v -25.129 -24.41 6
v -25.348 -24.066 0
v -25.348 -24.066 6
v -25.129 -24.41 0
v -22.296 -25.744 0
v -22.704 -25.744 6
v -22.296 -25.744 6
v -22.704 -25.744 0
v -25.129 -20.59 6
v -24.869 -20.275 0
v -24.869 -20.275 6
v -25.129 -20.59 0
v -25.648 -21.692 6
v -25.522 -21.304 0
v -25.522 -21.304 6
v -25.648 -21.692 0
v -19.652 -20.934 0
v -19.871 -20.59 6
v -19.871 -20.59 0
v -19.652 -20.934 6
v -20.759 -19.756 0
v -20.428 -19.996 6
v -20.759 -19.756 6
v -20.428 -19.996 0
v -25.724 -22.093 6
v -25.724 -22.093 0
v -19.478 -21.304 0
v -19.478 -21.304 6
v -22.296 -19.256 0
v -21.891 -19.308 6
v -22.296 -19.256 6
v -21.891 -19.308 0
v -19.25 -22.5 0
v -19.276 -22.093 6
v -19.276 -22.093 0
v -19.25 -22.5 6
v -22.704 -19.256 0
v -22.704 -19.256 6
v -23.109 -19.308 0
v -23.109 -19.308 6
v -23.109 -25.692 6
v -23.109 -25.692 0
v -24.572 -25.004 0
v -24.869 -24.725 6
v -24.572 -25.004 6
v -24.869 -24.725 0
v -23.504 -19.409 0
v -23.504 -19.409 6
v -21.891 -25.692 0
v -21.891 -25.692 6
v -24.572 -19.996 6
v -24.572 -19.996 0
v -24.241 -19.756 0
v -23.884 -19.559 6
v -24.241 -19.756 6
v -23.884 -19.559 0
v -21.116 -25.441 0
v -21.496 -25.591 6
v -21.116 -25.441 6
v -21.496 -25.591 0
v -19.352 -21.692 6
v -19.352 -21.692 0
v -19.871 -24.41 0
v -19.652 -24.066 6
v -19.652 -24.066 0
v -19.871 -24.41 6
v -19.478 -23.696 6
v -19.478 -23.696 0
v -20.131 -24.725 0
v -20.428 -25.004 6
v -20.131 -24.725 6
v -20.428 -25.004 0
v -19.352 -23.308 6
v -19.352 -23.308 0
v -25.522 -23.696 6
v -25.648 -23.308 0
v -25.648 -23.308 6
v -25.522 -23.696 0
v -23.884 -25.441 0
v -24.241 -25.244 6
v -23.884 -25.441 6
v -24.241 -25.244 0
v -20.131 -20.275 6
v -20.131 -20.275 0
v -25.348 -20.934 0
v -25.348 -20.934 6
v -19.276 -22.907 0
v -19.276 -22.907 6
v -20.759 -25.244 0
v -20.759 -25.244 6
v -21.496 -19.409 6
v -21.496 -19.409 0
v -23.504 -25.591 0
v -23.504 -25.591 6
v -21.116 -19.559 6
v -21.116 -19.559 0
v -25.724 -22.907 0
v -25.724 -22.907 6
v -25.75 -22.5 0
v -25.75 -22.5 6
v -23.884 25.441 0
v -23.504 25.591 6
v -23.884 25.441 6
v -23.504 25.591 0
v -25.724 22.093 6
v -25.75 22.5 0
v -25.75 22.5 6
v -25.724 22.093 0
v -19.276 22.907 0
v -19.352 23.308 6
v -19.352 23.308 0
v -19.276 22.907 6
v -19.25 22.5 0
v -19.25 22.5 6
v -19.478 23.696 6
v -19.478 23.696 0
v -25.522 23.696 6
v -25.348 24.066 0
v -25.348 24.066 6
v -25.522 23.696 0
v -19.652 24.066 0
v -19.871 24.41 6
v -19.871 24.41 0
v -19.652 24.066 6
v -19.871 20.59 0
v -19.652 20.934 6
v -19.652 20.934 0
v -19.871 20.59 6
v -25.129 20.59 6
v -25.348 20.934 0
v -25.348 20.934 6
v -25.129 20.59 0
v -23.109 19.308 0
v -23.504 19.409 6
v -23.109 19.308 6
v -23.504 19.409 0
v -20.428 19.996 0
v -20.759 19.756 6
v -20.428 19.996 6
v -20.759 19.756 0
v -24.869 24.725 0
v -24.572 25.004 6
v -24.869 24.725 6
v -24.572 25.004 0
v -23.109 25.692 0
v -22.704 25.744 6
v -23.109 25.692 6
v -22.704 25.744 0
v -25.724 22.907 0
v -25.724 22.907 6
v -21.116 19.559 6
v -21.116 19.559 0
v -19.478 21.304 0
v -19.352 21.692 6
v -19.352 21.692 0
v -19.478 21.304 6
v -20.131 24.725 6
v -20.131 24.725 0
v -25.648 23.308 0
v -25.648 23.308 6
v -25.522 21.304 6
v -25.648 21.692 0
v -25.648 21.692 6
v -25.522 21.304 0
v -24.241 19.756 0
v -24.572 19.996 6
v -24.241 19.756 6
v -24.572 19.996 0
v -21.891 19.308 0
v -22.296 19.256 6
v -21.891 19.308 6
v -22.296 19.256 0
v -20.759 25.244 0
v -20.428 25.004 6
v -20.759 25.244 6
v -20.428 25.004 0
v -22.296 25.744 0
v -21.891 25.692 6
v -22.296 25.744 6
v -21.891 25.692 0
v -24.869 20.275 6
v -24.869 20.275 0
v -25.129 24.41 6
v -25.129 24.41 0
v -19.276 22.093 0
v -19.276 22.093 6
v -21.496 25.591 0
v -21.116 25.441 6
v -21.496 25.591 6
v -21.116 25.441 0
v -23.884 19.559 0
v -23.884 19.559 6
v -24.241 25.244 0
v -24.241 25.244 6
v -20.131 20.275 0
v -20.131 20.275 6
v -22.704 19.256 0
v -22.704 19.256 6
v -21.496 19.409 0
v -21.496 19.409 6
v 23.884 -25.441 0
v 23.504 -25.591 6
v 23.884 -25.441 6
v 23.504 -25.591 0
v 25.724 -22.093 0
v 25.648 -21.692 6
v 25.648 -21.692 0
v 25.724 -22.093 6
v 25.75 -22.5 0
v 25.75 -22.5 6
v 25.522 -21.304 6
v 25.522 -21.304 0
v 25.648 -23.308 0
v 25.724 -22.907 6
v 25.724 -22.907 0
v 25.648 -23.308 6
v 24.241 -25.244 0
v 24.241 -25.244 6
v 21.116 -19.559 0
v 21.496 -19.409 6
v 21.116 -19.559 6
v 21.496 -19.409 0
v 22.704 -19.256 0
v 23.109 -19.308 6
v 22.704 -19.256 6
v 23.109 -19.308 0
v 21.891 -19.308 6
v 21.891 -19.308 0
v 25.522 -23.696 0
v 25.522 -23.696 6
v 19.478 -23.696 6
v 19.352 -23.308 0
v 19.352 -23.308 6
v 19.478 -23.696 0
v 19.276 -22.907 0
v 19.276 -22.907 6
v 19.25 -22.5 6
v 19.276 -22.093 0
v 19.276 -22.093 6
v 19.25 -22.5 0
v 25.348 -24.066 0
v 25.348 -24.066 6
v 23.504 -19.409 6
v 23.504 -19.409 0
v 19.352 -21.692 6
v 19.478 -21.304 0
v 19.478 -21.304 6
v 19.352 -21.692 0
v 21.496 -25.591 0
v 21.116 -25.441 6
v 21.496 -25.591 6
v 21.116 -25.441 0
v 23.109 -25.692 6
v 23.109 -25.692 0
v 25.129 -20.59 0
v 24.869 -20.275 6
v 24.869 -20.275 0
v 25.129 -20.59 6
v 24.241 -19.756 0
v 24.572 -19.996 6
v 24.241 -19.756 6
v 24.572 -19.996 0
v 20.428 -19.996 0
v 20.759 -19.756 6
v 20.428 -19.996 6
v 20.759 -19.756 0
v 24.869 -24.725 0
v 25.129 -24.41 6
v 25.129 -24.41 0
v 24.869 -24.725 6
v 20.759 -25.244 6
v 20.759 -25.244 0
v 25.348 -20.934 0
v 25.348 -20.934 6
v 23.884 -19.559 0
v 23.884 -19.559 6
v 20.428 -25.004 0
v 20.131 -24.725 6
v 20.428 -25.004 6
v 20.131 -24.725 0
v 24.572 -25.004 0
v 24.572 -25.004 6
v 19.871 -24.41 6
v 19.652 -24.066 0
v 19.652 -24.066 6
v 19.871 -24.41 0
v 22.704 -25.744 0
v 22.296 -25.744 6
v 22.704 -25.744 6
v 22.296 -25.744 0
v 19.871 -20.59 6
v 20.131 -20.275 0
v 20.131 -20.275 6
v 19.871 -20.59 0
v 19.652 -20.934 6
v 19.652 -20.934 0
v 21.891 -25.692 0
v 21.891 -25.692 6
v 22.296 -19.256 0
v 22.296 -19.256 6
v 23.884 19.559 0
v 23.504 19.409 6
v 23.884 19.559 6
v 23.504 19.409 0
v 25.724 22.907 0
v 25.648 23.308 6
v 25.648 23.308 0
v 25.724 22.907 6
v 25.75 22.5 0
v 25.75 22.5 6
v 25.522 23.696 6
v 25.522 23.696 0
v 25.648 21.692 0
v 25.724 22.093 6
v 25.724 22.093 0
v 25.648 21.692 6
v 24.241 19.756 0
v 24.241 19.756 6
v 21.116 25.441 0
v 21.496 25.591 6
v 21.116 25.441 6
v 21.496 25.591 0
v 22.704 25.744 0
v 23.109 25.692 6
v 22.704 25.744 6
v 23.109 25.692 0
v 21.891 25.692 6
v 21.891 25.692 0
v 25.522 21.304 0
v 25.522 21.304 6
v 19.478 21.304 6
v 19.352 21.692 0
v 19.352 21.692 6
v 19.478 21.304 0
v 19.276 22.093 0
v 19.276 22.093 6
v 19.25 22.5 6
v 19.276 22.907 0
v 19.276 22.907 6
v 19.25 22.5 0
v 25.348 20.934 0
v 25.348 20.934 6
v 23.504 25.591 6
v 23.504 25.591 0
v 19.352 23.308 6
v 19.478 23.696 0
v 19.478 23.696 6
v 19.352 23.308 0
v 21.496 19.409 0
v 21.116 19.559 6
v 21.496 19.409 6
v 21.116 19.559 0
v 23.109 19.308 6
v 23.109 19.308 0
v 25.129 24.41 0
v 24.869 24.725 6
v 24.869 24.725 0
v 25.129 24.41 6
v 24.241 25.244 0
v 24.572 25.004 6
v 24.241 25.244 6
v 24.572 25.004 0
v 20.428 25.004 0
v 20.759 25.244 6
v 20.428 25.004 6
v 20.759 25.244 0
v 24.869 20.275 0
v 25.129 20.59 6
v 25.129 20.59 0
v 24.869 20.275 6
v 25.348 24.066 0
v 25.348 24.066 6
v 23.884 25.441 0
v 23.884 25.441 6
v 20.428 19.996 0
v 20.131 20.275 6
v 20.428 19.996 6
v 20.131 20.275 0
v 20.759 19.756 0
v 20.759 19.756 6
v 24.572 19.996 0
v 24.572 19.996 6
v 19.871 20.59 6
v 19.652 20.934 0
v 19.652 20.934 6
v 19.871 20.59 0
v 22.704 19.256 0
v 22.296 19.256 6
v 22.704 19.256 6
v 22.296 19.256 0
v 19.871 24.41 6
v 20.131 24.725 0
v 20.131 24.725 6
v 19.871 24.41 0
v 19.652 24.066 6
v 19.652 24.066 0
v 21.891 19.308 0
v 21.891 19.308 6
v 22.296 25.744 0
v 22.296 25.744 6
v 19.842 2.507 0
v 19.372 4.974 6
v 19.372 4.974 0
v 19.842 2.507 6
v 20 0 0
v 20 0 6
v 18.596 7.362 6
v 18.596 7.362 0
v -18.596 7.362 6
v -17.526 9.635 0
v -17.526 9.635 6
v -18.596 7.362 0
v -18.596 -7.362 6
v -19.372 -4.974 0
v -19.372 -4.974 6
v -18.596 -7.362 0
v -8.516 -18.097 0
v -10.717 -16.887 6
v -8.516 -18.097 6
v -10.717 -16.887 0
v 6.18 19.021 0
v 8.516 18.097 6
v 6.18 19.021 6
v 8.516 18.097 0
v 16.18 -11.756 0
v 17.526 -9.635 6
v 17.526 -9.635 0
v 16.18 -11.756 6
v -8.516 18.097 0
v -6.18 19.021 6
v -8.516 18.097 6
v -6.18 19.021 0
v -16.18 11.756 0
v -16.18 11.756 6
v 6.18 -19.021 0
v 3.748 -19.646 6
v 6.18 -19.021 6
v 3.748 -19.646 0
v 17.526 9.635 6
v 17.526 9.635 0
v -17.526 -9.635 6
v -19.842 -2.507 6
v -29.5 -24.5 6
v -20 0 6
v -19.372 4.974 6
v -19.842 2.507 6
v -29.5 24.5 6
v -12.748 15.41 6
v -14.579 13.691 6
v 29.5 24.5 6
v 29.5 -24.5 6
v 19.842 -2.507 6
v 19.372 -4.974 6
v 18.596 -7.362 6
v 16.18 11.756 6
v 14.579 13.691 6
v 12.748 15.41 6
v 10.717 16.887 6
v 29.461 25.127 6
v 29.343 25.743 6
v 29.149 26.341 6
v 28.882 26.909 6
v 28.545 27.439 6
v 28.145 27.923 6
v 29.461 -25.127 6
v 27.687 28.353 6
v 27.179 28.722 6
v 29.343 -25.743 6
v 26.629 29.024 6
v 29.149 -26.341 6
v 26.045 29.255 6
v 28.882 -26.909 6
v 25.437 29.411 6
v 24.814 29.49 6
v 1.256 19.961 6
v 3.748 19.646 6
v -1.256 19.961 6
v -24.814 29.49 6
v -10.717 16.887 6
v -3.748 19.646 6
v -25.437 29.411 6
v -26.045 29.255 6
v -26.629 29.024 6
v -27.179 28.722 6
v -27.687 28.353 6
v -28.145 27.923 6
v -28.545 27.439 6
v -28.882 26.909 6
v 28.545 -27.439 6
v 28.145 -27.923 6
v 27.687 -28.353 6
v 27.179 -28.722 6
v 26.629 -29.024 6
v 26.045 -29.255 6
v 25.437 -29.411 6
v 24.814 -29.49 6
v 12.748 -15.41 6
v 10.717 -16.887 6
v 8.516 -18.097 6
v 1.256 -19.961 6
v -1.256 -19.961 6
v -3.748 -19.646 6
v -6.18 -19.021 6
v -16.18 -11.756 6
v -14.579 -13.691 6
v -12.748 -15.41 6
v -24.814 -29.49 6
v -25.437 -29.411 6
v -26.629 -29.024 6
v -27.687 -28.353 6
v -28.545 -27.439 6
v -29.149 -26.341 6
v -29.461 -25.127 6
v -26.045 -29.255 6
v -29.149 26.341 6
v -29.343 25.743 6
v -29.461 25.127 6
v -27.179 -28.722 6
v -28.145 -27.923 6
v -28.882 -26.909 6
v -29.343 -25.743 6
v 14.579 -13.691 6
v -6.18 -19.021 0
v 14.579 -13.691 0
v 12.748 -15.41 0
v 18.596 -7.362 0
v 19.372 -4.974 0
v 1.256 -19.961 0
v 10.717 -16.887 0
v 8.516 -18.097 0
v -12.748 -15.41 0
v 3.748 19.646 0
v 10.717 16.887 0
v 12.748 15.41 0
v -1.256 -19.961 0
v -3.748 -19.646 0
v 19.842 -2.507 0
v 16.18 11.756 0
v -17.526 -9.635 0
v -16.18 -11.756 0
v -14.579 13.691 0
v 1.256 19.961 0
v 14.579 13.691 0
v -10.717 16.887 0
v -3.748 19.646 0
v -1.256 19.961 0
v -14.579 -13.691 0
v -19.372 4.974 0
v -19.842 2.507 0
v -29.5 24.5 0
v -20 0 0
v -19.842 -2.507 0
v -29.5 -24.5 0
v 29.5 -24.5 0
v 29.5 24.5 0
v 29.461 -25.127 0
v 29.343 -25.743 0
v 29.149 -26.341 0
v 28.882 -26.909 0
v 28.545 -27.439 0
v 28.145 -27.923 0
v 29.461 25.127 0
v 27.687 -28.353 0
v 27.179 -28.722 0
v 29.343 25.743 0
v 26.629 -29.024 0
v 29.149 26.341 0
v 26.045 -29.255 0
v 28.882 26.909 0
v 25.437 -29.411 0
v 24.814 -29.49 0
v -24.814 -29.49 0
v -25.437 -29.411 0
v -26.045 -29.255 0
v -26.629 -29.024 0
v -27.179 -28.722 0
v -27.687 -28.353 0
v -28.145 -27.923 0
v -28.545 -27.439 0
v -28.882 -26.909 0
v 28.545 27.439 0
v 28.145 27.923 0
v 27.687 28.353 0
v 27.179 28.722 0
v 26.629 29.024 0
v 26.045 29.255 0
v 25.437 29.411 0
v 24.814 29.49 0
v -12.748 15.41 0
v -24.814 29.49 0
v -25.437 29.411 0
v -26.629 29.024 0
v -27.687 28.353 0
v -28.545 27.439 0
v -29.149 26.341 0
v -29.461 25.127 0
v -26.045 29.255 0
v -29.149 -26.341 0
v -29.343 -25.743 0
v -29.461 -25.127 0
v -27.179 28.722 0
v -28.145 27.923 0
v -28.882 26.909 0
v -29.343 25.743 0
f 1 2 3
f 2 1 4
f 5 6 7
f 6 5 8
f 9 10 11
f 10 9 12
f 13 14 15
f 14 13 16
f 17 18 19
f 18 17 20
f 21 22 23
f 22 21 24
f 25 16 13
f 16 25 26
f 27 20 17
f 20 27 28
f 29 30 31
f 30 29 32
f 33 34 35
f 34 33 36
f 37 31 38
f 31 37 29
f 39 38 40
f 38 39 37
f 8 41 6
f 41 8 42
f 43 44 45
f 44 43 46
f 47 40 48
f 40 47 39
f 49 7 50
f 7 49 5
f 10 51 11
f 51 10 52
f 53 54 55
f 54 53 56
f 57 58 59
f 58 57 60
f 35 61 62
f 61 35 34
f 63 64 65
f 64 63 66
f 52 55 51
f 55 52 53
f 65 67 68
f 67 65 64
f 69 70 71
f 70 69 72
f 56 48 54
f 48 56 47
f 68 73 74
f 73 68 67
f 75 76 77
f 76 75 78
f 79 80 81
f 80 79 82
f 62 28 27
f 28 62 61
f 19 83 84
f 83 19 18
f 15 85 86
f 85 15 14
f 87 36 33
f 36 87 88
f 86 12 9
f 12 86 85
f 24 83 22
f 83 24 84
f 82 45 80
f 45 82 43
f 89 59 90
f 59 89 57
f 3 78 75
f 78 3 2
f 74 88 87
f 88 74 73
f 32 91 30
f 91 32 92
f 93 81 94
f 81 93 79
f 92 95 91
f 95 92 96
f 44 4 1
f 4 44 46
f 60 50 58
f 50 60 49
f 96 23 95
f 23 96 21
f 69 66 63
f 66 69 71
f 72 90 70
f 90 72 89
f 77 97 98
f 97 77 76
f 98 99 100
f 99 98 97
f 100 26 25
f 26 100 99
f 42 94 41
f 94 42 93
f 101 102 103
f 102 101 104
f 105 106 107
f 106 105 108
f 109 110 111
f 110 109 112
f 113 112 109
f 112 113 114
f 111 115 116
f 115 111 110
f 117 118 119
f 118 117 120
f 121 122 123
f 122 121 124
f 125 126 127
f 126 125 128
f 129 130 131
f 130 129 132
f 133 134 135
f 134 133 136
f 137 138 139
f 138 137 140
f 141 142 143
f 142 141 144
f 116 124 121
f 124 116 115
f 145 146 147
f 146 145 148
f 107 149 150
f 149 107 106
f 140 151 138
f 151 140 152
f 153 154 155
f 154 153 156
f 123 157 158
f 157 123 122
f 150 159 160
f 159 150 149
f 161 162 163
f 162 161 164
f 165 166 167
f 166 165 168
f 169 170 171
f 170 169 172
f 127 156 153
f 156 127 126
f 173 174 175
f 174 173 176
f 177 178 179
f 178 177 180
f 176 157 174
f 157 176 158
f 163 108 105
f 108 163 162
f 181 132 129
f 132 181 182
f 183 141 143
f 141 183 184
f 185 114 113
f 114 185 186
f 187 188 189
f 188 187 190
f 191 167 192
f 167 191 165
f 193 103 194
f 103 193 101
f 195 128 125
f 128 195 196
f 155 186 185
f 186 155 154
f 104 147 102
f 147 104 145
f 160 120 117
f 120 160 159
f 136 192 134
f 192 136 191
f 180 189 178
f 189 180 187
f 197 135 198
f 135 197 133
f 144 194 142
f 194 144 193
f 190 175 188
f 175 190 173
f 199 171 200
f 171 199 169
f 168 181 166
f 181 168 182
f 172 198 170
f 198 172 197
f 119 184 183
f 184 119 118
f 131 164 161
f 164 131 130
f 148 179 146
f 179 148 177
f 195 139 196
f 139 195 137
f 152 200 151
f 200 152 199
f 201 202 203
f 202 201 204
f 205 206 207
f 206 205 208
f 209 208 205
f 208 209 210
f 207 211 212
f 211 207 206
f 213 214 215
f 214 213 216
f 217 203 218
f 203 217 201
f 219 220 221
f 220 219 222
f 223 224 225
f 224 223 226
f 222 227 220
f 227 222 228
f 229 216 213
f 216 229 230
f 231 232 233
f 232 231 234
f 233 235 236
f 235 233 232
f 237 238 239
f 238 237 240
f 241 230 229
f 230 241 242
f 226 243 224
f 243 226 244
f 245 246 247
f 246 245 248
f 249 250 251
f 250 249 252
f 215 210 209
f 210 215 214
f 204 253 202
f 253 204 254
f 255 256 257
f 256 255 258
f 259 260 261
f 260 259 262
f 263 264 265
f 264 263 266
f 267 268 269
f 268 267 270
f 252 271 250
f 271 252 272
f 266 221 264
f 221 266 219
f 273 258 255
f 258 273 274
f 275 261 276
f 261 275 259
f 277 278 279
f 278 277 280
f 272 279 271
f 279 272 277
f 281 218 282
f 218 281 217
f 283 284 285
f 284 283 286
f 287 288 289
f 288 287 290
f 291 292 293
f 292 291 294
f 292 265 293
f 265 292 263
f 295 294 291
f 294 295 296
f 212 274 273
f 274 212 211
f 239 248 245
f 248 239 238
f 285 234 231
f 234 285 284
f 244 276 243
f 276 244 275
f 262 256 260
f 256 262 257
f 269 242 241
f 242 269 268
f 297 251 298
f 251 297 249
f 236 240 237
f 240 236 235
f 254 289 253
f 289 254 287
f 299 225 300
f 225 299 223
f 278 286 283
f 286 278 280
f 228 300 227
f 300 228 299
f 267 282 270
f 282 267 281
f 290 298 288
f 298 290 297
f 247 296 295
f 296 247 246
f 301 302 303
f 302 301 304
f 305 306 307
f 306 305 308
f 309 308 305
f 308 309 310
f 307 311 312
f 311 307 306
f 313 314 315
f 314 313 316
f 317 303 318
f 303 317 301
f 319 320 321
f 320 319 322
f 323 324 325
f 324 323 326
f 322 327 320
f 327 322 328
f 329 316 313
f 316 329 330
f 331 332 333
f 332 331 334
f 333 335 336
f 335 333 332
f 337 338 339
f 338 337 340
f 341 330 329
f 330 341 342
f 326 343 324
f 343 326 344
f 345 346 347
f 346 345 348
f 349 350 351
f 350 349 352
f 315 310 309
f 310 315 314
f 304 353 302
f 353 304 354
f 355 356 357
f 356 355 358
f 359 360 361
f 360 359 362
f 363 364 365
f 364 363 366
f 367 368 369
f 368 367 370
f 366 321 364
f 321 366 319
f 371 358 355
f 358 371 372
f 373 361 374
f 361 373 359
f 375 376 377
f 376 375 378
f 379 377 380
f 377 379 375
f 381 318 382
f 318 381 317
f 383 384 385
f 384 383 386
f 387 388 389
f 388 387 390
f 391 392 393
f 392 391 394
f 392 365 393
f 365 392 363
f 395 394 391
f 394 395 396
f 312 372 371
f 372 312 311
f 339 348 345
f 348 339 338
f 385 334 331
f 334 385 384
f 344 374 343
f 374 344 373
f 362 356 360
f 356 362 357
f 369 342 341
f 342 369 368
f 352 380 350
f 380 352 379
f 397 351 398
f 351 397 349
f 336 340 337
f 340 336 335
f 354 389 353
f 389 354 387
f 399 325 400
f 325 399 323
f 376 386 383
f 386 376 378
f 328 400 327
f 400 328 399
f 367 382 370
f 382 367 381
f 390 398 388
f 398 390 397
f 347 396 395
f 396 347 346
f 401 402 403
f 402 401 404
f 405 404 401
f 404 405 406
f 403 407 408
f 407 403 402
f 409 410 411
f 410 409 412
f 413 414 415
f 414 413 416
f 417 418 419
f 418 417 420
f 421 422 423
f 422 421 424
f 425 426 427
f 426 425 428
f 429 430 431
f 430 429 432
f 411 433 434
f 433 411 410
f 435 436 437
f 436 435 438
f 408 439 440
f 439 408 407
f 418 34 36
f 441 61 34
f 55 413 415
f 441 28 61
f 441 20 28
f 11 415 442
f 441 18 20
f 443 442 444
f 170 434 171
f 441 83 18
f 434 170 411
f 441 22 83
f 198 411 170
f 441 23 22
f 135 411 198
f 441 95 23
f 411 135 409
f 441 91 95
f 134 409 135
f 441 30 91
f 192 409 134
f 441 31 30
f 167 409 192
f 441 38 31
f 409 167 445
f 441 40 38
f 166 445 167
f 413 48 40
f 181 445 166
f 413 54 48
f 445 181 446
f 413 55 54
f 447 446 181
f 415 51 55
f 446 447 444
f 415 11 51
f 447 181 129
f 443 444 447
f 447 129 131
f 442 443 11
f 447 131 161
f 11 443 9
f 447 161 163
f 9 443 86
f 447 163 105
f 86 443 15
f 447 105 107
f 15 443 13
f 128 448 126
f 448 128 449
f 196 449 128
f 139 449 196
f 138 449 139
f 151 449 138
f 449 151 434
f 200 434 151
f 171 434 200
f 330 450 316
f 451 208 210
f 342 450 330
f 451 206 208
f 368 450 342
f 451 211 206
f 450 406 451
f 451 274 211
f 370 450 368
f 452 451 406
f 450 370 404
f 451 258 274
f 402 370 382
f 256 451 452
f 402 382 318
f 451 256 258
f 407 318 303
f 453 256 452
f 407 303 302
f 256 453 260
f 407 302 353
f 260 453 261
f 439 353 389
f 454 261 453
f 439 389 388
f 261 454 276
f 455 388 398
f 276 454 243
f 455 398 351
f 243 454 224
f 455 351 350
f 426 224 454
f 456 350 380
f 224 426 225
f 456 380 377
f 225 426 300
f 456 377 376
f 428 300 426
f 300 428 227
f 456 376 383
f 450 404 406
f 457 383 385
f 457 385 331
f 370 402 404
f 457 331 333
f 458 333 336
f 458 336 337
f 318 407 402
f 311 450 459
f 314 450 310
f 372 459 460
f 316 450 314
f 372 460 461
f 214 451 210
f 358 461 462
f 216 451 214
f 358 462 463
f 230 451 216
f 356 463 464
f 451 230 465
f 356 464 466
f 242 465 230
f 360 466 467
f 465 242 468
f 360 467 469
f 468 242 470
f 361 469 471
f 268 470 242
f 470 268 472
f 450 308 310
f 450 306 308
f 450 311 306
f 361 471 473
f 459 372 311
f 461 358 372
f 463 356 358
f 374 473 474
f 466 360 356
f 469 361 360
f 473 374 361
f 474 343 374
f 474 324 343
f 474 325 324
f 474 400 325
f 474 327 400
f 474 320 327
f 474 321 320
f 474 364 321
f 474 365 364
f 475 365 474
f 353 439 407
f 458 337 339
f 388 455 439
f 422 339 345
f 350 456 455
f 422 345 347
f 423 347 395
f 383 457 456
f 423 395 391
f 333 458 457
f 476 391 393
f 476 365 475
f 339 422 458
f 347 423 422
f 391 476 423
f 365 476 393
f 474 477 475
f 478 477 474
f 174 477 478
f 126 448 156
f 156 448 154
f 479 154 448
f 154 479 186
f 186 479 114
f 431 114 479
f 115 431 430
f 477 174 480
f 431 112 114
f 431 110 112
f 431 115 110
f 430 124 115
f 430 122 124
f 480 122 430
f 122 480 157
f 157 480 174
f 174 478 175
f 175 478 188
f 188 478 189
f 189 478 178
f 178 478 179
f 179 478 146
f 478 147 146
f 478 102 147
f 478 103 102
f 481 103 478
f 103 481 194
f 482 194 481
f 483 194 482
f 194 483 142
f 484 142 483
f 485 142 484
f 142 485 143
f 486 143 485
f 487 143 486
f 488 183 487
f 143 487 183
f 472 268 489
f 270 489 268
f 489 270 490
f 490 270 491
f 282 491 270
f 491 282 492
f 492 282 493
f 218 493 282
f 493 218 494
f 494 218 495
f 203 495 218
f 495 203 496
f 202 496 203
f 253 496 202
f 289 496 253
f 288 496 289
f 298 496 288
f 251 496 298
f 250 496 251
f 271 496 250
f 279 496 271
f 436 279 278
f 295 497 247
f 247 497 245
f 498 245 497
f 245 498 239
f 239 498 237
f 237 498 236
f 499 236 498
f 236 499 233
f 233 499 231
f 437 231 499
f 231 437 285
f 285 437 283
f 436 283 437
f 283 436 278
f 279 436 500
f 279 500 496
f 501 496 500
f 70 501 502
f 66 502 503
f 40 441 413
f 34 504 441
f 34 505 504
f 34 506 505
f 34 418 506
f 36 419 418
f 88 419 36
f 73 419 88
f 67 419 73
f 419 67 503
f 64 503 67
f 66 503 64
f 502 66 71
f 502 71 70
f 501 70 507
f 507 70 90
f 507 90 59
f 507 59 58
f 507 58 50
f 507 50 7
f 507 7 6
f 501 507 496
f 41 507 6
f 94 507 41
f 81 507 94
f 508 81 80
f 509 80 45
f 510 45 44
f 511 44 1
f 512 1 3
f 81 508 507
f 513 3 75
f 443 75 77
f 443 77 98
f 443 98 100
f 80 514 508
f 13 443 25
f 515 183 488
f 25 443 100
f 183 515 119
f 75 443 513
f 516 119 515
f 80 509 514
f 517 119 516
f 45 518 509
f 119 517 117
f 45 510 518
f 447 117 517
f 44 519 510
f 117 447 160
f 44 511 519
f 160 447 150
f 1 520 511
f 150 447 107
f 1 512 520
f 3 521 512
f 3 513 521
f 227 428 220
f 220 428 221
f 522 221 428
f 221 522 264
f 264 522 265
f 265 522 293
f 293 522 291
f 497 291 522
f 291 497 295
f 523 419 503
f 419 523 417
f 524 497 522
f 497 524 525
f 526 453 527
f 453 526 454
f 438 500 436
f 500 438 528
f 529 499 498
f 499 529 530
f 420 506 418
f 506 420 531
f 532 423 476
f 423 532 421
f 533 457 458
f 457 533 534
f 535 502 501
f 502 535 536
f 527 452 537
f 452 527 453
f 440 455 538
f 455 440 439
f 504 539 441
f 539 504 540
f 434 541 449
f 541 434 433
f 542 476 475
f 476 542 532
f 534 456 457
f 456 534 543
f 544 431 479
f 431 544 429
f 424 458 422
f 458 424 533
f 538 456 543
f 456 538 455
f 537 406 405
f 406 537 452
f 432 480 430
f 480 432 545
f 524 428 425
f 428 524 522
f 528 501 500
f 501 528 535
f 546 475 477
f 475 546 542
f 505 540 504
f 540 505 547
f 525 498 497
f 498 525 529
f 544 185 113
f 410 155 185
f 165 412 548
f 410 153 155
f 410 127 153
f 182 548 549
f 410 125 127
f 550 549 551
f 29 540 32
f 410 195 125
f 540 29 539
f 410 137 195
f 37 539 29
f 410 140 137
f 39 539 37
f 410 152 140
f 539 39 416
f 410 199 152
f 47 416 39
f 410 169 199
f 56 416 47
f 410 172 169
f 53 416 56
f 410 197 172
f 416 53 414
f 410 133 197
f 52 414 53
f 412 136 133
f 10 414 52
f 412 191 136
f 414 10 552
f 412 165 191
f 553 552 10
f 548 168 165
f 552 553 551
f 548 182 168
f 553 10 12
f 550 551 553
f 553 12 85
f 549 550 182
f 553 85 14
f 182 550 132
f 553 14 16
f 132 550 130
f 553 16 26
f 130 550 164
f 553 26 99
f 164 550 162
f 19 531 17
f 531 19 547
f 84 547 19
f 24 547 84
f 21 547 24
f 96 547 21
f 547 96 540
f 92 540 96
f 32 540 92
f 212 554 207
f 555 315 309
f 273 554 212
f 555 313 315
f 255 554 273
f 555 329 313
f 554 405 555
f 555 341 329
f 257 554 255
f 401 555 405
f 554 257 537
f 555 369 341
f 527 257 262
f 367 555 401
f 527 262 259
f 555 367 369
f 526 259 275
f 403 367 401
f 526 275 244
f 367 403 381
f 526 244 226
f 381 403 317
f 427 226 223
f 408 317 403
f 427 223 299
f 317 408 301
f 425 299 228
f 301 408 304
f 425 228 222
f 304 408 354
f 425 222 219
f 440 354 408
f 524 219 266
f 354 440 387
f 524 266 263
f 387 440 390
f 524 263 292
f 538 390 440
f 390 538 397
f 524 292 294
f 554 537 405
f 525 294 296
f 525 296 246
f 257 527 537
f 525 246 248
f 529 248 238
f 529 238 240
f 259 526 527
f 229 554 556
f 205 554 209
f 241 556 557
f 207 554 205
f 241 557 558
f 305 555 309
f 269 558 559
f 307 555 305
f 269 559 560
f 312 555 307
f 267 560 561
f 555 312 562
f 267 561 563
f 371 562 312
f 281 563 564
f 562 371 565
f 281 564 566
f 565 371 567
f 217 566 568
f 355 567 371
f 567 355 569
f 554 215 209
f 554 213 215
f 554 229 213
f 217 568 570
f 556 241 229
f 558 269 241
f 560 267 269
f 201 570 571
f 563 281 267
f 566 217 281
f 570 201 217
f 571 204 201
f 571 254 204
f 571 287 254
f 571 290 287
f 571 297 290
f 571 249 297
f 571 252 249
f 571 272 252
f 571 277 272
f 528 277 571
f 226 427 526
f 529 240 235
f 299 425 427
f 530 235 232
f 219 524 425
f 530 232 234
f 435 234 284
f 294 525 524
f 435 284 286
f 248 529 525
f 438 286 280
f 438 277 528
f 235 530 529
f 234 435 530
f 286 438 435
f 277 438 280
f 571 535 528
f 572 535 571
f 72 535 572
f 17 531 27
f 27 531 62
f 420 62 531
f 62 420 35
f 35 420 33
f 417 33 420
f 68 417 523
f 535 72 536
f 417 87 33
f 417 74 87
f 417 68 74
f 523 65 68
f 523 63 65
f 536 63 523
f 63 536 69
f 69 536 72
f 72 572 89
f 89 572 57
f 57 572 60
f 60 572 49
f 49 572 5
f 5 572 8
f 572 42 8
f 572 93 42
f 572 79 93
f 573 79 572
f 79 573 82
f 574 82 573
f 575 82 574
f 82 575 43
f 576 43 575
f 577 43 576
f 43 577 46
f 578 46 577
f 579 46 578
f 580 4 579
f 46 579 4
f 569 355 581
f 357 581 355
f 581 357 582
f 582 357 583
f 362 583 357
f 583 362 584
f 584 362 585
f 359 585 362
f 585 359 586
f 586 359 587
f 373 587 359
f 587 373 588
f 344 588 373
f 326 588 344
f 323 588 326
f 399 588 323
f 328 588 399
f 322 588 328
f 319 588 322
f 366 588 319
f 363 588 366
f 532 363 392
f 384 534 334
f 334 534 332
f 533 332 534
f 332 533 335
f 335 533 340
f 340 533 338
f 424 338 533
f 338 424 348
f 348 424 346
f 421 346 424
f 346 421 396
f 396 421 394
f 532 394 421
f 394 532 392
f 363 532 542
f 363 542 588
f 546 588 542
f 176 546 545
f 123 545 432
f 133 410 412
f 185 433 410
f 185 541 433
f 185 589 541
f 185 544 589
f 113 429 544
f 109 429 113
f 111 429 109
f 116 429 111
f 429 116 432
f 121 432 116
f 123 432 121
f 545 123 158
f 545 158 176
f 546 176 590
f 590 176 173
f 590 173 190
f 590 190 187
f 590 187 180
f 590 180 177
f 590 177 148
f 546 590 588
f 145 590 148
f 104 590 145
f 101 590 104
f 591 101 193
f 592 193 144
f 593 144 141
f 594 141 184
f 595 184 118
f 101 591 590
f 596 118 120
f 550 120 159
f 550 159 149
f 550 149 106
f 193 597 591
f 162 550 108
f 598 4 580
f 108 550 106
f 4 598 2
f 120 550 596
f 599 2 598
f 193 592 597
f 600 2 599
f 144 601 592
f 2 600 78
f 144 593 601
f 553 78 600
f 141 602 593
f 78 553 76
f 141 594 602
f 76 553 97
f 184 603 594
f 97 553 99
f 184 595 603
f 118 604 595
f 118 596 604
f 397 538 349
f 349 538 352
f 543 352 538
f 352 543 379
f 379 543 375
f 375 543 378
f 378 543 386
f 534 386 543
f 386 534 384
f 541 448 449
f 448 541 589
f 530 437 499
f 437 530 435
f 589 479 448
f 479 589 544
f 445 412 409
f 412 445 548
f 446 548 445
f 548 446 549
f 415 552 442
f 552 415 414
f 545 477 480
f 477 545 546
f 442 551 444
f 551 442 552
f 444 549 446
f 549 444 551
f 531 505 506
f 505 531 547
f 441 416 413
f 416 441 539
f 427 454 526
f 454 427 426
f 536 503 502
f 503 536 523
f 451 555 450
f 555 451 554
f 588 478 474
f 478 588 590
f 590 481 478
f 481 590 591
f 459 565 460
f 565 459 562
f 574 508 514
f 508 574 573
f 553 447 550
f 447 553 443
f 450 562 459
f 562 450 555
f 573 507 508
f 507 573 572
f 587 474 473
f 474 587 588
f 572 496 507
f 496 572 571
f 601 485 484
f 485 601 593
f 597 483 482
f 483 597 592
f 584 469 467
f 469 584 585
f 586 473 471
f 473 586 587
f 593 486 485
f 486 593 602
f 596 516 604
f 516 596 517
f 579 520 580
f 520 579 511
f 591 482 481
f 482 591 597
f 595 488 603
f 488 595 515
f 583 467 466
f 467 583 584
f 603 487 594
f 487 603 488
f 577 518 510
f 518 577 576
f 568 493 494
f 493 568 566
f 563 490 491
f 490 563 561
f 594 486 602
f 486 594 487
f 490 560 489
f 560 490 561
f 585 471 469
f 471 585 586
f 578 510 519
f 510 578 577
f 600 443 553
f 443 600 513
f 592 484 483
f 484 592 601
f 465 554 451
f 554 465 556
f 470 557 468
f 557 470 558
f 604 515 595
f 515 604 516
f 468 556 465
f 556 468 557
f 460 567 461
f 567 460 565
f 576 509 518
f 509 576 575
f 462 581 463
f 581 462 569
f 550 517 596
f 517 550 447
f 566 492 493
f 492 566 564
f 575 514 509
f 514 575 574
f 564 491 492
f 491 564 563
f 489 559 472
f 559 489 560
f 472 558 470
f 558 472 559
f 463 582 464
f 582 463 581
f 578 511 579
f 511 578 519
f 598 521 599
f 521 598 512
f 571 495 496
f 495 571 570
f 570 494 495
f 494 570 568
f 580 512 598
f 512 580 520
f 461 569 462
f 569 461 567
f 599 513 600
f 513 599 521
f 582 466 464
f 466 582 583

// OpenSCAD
$fn = 50;


difference() {
	union() {
		hull() {
			translate(v = [-24.5000000000, 24.5000000000, 0]) {
				cylinder(h = 6, r = 5);
			}
			translate(v = [24.5000000000, 24.5000000000, 0]) {
				cylinder(h = 6, r = 5);
			}
			translate(v = [-24.5000000000, -24.5000000000, 0]) {
				cylinder(h = 6, r = 5);
			}
			translate(v = [24.5000000000, -24.5000000000, 0]) {
				cylinder(h = 6, r = 5);
			}
		}
	}
	union() {
		#translate(v = [-22.5000000000, -22.5000000000, -100.0000000000]) {
			cylinder(h = 200, r = 3.2500000000);
		}
		#translate(v = [-22.5000000000, 22.5000000000, -100.0000000000]) {
			cylinder(h = 200, r = 3.2500000000);
		}
		#translate(v = [22.5000000000, -22.5000000000, -100.0000000000]) {
			cylinder(h = 200, r = 3.2500000000);
		}
		#translate(v = [22.5000000000, 22.5000000000, -100.0000000000]) {
			cylinder(h = 200, r = 3.2500000000);
		}
		#cylinder(h = 6, r = 20.0000000000);
	}
}
